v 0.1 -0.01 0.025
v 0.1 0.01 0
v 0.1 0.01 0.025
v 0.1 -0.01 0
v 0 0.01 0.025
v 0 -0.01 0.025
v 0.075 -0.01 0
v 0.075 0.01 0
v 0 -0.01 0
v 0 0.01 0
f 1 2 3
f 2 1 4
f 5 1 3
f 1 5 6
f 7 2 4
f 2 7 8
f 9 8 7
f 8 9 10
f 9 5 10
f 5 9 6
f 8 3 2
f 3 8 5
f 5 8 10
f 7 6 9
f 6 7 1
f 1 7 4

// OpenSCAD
s = 1;

length = 0.1;
width = 0.025;
depth = 0.020;
chfdepth = 0;
chfangle = 45;
tcpoffset = 0.075;
cutpos = 0.0;
cutdepth = 0.0;
cutangle = 90;
cuttilt = 0;

/* Produces basic box finger */
module basicShape(length, width, depth)
{
	translate([0, -depth/2, 0]) cube([length, depth, width]);
}

/* Produces the chamfering geometry.
 * length -- length of the finger
 * start_depth -- distance from the finger plane at which the chamfer starts
 * angle --- chamfering angle
 */
module chamfering(length, start_depth, angle) {
	size = 1000;

	translate([length, 0, start_depth])
		rotate([0, 90-angle, 0])
			translate([0, 0, size/2])
				cube(size, center = true);
}

/* Produces the geometry for the cutout.
 * cutpos -- position of the cutout
 * cutdepth -- depth of the cutout
 * cutangle -- the angle of the cutout
 * cuttilt -- the tilt of the cutout
 */
module cutout(cutpos, cutdepth, cutangle, cuttilt) {
	size = 1000;

	s_x = tan(cutangle /2);

	translate([cutpos, 0, cutdepth])
		rotate([0, 0, cuttilt])
			rotate([0, 135, 0])
				translate([0, -size/2, 0])
					scale([s_x, 1, 1])
						cube(size);
}

/* Produces the finger geometry.
 * Parameters...
 */
module finger(length, width, depth, chfdepth, chfangle, cutpos, cutdepth, cutangle, cuttilt) {
	difference() {
		difference() {
			basicShape(length, width, depth);
			chamfering(length, width - width * chfdepth, chfangle);
		}
		cutout(cutpos, cutdepth, cutangle, cuttilt);
	}
}

scale(s)
	finger(length, width, depth, chfdepth, chfangle, tcpoffset+cutpos, cutdepth, cutangle, cuttilt);
